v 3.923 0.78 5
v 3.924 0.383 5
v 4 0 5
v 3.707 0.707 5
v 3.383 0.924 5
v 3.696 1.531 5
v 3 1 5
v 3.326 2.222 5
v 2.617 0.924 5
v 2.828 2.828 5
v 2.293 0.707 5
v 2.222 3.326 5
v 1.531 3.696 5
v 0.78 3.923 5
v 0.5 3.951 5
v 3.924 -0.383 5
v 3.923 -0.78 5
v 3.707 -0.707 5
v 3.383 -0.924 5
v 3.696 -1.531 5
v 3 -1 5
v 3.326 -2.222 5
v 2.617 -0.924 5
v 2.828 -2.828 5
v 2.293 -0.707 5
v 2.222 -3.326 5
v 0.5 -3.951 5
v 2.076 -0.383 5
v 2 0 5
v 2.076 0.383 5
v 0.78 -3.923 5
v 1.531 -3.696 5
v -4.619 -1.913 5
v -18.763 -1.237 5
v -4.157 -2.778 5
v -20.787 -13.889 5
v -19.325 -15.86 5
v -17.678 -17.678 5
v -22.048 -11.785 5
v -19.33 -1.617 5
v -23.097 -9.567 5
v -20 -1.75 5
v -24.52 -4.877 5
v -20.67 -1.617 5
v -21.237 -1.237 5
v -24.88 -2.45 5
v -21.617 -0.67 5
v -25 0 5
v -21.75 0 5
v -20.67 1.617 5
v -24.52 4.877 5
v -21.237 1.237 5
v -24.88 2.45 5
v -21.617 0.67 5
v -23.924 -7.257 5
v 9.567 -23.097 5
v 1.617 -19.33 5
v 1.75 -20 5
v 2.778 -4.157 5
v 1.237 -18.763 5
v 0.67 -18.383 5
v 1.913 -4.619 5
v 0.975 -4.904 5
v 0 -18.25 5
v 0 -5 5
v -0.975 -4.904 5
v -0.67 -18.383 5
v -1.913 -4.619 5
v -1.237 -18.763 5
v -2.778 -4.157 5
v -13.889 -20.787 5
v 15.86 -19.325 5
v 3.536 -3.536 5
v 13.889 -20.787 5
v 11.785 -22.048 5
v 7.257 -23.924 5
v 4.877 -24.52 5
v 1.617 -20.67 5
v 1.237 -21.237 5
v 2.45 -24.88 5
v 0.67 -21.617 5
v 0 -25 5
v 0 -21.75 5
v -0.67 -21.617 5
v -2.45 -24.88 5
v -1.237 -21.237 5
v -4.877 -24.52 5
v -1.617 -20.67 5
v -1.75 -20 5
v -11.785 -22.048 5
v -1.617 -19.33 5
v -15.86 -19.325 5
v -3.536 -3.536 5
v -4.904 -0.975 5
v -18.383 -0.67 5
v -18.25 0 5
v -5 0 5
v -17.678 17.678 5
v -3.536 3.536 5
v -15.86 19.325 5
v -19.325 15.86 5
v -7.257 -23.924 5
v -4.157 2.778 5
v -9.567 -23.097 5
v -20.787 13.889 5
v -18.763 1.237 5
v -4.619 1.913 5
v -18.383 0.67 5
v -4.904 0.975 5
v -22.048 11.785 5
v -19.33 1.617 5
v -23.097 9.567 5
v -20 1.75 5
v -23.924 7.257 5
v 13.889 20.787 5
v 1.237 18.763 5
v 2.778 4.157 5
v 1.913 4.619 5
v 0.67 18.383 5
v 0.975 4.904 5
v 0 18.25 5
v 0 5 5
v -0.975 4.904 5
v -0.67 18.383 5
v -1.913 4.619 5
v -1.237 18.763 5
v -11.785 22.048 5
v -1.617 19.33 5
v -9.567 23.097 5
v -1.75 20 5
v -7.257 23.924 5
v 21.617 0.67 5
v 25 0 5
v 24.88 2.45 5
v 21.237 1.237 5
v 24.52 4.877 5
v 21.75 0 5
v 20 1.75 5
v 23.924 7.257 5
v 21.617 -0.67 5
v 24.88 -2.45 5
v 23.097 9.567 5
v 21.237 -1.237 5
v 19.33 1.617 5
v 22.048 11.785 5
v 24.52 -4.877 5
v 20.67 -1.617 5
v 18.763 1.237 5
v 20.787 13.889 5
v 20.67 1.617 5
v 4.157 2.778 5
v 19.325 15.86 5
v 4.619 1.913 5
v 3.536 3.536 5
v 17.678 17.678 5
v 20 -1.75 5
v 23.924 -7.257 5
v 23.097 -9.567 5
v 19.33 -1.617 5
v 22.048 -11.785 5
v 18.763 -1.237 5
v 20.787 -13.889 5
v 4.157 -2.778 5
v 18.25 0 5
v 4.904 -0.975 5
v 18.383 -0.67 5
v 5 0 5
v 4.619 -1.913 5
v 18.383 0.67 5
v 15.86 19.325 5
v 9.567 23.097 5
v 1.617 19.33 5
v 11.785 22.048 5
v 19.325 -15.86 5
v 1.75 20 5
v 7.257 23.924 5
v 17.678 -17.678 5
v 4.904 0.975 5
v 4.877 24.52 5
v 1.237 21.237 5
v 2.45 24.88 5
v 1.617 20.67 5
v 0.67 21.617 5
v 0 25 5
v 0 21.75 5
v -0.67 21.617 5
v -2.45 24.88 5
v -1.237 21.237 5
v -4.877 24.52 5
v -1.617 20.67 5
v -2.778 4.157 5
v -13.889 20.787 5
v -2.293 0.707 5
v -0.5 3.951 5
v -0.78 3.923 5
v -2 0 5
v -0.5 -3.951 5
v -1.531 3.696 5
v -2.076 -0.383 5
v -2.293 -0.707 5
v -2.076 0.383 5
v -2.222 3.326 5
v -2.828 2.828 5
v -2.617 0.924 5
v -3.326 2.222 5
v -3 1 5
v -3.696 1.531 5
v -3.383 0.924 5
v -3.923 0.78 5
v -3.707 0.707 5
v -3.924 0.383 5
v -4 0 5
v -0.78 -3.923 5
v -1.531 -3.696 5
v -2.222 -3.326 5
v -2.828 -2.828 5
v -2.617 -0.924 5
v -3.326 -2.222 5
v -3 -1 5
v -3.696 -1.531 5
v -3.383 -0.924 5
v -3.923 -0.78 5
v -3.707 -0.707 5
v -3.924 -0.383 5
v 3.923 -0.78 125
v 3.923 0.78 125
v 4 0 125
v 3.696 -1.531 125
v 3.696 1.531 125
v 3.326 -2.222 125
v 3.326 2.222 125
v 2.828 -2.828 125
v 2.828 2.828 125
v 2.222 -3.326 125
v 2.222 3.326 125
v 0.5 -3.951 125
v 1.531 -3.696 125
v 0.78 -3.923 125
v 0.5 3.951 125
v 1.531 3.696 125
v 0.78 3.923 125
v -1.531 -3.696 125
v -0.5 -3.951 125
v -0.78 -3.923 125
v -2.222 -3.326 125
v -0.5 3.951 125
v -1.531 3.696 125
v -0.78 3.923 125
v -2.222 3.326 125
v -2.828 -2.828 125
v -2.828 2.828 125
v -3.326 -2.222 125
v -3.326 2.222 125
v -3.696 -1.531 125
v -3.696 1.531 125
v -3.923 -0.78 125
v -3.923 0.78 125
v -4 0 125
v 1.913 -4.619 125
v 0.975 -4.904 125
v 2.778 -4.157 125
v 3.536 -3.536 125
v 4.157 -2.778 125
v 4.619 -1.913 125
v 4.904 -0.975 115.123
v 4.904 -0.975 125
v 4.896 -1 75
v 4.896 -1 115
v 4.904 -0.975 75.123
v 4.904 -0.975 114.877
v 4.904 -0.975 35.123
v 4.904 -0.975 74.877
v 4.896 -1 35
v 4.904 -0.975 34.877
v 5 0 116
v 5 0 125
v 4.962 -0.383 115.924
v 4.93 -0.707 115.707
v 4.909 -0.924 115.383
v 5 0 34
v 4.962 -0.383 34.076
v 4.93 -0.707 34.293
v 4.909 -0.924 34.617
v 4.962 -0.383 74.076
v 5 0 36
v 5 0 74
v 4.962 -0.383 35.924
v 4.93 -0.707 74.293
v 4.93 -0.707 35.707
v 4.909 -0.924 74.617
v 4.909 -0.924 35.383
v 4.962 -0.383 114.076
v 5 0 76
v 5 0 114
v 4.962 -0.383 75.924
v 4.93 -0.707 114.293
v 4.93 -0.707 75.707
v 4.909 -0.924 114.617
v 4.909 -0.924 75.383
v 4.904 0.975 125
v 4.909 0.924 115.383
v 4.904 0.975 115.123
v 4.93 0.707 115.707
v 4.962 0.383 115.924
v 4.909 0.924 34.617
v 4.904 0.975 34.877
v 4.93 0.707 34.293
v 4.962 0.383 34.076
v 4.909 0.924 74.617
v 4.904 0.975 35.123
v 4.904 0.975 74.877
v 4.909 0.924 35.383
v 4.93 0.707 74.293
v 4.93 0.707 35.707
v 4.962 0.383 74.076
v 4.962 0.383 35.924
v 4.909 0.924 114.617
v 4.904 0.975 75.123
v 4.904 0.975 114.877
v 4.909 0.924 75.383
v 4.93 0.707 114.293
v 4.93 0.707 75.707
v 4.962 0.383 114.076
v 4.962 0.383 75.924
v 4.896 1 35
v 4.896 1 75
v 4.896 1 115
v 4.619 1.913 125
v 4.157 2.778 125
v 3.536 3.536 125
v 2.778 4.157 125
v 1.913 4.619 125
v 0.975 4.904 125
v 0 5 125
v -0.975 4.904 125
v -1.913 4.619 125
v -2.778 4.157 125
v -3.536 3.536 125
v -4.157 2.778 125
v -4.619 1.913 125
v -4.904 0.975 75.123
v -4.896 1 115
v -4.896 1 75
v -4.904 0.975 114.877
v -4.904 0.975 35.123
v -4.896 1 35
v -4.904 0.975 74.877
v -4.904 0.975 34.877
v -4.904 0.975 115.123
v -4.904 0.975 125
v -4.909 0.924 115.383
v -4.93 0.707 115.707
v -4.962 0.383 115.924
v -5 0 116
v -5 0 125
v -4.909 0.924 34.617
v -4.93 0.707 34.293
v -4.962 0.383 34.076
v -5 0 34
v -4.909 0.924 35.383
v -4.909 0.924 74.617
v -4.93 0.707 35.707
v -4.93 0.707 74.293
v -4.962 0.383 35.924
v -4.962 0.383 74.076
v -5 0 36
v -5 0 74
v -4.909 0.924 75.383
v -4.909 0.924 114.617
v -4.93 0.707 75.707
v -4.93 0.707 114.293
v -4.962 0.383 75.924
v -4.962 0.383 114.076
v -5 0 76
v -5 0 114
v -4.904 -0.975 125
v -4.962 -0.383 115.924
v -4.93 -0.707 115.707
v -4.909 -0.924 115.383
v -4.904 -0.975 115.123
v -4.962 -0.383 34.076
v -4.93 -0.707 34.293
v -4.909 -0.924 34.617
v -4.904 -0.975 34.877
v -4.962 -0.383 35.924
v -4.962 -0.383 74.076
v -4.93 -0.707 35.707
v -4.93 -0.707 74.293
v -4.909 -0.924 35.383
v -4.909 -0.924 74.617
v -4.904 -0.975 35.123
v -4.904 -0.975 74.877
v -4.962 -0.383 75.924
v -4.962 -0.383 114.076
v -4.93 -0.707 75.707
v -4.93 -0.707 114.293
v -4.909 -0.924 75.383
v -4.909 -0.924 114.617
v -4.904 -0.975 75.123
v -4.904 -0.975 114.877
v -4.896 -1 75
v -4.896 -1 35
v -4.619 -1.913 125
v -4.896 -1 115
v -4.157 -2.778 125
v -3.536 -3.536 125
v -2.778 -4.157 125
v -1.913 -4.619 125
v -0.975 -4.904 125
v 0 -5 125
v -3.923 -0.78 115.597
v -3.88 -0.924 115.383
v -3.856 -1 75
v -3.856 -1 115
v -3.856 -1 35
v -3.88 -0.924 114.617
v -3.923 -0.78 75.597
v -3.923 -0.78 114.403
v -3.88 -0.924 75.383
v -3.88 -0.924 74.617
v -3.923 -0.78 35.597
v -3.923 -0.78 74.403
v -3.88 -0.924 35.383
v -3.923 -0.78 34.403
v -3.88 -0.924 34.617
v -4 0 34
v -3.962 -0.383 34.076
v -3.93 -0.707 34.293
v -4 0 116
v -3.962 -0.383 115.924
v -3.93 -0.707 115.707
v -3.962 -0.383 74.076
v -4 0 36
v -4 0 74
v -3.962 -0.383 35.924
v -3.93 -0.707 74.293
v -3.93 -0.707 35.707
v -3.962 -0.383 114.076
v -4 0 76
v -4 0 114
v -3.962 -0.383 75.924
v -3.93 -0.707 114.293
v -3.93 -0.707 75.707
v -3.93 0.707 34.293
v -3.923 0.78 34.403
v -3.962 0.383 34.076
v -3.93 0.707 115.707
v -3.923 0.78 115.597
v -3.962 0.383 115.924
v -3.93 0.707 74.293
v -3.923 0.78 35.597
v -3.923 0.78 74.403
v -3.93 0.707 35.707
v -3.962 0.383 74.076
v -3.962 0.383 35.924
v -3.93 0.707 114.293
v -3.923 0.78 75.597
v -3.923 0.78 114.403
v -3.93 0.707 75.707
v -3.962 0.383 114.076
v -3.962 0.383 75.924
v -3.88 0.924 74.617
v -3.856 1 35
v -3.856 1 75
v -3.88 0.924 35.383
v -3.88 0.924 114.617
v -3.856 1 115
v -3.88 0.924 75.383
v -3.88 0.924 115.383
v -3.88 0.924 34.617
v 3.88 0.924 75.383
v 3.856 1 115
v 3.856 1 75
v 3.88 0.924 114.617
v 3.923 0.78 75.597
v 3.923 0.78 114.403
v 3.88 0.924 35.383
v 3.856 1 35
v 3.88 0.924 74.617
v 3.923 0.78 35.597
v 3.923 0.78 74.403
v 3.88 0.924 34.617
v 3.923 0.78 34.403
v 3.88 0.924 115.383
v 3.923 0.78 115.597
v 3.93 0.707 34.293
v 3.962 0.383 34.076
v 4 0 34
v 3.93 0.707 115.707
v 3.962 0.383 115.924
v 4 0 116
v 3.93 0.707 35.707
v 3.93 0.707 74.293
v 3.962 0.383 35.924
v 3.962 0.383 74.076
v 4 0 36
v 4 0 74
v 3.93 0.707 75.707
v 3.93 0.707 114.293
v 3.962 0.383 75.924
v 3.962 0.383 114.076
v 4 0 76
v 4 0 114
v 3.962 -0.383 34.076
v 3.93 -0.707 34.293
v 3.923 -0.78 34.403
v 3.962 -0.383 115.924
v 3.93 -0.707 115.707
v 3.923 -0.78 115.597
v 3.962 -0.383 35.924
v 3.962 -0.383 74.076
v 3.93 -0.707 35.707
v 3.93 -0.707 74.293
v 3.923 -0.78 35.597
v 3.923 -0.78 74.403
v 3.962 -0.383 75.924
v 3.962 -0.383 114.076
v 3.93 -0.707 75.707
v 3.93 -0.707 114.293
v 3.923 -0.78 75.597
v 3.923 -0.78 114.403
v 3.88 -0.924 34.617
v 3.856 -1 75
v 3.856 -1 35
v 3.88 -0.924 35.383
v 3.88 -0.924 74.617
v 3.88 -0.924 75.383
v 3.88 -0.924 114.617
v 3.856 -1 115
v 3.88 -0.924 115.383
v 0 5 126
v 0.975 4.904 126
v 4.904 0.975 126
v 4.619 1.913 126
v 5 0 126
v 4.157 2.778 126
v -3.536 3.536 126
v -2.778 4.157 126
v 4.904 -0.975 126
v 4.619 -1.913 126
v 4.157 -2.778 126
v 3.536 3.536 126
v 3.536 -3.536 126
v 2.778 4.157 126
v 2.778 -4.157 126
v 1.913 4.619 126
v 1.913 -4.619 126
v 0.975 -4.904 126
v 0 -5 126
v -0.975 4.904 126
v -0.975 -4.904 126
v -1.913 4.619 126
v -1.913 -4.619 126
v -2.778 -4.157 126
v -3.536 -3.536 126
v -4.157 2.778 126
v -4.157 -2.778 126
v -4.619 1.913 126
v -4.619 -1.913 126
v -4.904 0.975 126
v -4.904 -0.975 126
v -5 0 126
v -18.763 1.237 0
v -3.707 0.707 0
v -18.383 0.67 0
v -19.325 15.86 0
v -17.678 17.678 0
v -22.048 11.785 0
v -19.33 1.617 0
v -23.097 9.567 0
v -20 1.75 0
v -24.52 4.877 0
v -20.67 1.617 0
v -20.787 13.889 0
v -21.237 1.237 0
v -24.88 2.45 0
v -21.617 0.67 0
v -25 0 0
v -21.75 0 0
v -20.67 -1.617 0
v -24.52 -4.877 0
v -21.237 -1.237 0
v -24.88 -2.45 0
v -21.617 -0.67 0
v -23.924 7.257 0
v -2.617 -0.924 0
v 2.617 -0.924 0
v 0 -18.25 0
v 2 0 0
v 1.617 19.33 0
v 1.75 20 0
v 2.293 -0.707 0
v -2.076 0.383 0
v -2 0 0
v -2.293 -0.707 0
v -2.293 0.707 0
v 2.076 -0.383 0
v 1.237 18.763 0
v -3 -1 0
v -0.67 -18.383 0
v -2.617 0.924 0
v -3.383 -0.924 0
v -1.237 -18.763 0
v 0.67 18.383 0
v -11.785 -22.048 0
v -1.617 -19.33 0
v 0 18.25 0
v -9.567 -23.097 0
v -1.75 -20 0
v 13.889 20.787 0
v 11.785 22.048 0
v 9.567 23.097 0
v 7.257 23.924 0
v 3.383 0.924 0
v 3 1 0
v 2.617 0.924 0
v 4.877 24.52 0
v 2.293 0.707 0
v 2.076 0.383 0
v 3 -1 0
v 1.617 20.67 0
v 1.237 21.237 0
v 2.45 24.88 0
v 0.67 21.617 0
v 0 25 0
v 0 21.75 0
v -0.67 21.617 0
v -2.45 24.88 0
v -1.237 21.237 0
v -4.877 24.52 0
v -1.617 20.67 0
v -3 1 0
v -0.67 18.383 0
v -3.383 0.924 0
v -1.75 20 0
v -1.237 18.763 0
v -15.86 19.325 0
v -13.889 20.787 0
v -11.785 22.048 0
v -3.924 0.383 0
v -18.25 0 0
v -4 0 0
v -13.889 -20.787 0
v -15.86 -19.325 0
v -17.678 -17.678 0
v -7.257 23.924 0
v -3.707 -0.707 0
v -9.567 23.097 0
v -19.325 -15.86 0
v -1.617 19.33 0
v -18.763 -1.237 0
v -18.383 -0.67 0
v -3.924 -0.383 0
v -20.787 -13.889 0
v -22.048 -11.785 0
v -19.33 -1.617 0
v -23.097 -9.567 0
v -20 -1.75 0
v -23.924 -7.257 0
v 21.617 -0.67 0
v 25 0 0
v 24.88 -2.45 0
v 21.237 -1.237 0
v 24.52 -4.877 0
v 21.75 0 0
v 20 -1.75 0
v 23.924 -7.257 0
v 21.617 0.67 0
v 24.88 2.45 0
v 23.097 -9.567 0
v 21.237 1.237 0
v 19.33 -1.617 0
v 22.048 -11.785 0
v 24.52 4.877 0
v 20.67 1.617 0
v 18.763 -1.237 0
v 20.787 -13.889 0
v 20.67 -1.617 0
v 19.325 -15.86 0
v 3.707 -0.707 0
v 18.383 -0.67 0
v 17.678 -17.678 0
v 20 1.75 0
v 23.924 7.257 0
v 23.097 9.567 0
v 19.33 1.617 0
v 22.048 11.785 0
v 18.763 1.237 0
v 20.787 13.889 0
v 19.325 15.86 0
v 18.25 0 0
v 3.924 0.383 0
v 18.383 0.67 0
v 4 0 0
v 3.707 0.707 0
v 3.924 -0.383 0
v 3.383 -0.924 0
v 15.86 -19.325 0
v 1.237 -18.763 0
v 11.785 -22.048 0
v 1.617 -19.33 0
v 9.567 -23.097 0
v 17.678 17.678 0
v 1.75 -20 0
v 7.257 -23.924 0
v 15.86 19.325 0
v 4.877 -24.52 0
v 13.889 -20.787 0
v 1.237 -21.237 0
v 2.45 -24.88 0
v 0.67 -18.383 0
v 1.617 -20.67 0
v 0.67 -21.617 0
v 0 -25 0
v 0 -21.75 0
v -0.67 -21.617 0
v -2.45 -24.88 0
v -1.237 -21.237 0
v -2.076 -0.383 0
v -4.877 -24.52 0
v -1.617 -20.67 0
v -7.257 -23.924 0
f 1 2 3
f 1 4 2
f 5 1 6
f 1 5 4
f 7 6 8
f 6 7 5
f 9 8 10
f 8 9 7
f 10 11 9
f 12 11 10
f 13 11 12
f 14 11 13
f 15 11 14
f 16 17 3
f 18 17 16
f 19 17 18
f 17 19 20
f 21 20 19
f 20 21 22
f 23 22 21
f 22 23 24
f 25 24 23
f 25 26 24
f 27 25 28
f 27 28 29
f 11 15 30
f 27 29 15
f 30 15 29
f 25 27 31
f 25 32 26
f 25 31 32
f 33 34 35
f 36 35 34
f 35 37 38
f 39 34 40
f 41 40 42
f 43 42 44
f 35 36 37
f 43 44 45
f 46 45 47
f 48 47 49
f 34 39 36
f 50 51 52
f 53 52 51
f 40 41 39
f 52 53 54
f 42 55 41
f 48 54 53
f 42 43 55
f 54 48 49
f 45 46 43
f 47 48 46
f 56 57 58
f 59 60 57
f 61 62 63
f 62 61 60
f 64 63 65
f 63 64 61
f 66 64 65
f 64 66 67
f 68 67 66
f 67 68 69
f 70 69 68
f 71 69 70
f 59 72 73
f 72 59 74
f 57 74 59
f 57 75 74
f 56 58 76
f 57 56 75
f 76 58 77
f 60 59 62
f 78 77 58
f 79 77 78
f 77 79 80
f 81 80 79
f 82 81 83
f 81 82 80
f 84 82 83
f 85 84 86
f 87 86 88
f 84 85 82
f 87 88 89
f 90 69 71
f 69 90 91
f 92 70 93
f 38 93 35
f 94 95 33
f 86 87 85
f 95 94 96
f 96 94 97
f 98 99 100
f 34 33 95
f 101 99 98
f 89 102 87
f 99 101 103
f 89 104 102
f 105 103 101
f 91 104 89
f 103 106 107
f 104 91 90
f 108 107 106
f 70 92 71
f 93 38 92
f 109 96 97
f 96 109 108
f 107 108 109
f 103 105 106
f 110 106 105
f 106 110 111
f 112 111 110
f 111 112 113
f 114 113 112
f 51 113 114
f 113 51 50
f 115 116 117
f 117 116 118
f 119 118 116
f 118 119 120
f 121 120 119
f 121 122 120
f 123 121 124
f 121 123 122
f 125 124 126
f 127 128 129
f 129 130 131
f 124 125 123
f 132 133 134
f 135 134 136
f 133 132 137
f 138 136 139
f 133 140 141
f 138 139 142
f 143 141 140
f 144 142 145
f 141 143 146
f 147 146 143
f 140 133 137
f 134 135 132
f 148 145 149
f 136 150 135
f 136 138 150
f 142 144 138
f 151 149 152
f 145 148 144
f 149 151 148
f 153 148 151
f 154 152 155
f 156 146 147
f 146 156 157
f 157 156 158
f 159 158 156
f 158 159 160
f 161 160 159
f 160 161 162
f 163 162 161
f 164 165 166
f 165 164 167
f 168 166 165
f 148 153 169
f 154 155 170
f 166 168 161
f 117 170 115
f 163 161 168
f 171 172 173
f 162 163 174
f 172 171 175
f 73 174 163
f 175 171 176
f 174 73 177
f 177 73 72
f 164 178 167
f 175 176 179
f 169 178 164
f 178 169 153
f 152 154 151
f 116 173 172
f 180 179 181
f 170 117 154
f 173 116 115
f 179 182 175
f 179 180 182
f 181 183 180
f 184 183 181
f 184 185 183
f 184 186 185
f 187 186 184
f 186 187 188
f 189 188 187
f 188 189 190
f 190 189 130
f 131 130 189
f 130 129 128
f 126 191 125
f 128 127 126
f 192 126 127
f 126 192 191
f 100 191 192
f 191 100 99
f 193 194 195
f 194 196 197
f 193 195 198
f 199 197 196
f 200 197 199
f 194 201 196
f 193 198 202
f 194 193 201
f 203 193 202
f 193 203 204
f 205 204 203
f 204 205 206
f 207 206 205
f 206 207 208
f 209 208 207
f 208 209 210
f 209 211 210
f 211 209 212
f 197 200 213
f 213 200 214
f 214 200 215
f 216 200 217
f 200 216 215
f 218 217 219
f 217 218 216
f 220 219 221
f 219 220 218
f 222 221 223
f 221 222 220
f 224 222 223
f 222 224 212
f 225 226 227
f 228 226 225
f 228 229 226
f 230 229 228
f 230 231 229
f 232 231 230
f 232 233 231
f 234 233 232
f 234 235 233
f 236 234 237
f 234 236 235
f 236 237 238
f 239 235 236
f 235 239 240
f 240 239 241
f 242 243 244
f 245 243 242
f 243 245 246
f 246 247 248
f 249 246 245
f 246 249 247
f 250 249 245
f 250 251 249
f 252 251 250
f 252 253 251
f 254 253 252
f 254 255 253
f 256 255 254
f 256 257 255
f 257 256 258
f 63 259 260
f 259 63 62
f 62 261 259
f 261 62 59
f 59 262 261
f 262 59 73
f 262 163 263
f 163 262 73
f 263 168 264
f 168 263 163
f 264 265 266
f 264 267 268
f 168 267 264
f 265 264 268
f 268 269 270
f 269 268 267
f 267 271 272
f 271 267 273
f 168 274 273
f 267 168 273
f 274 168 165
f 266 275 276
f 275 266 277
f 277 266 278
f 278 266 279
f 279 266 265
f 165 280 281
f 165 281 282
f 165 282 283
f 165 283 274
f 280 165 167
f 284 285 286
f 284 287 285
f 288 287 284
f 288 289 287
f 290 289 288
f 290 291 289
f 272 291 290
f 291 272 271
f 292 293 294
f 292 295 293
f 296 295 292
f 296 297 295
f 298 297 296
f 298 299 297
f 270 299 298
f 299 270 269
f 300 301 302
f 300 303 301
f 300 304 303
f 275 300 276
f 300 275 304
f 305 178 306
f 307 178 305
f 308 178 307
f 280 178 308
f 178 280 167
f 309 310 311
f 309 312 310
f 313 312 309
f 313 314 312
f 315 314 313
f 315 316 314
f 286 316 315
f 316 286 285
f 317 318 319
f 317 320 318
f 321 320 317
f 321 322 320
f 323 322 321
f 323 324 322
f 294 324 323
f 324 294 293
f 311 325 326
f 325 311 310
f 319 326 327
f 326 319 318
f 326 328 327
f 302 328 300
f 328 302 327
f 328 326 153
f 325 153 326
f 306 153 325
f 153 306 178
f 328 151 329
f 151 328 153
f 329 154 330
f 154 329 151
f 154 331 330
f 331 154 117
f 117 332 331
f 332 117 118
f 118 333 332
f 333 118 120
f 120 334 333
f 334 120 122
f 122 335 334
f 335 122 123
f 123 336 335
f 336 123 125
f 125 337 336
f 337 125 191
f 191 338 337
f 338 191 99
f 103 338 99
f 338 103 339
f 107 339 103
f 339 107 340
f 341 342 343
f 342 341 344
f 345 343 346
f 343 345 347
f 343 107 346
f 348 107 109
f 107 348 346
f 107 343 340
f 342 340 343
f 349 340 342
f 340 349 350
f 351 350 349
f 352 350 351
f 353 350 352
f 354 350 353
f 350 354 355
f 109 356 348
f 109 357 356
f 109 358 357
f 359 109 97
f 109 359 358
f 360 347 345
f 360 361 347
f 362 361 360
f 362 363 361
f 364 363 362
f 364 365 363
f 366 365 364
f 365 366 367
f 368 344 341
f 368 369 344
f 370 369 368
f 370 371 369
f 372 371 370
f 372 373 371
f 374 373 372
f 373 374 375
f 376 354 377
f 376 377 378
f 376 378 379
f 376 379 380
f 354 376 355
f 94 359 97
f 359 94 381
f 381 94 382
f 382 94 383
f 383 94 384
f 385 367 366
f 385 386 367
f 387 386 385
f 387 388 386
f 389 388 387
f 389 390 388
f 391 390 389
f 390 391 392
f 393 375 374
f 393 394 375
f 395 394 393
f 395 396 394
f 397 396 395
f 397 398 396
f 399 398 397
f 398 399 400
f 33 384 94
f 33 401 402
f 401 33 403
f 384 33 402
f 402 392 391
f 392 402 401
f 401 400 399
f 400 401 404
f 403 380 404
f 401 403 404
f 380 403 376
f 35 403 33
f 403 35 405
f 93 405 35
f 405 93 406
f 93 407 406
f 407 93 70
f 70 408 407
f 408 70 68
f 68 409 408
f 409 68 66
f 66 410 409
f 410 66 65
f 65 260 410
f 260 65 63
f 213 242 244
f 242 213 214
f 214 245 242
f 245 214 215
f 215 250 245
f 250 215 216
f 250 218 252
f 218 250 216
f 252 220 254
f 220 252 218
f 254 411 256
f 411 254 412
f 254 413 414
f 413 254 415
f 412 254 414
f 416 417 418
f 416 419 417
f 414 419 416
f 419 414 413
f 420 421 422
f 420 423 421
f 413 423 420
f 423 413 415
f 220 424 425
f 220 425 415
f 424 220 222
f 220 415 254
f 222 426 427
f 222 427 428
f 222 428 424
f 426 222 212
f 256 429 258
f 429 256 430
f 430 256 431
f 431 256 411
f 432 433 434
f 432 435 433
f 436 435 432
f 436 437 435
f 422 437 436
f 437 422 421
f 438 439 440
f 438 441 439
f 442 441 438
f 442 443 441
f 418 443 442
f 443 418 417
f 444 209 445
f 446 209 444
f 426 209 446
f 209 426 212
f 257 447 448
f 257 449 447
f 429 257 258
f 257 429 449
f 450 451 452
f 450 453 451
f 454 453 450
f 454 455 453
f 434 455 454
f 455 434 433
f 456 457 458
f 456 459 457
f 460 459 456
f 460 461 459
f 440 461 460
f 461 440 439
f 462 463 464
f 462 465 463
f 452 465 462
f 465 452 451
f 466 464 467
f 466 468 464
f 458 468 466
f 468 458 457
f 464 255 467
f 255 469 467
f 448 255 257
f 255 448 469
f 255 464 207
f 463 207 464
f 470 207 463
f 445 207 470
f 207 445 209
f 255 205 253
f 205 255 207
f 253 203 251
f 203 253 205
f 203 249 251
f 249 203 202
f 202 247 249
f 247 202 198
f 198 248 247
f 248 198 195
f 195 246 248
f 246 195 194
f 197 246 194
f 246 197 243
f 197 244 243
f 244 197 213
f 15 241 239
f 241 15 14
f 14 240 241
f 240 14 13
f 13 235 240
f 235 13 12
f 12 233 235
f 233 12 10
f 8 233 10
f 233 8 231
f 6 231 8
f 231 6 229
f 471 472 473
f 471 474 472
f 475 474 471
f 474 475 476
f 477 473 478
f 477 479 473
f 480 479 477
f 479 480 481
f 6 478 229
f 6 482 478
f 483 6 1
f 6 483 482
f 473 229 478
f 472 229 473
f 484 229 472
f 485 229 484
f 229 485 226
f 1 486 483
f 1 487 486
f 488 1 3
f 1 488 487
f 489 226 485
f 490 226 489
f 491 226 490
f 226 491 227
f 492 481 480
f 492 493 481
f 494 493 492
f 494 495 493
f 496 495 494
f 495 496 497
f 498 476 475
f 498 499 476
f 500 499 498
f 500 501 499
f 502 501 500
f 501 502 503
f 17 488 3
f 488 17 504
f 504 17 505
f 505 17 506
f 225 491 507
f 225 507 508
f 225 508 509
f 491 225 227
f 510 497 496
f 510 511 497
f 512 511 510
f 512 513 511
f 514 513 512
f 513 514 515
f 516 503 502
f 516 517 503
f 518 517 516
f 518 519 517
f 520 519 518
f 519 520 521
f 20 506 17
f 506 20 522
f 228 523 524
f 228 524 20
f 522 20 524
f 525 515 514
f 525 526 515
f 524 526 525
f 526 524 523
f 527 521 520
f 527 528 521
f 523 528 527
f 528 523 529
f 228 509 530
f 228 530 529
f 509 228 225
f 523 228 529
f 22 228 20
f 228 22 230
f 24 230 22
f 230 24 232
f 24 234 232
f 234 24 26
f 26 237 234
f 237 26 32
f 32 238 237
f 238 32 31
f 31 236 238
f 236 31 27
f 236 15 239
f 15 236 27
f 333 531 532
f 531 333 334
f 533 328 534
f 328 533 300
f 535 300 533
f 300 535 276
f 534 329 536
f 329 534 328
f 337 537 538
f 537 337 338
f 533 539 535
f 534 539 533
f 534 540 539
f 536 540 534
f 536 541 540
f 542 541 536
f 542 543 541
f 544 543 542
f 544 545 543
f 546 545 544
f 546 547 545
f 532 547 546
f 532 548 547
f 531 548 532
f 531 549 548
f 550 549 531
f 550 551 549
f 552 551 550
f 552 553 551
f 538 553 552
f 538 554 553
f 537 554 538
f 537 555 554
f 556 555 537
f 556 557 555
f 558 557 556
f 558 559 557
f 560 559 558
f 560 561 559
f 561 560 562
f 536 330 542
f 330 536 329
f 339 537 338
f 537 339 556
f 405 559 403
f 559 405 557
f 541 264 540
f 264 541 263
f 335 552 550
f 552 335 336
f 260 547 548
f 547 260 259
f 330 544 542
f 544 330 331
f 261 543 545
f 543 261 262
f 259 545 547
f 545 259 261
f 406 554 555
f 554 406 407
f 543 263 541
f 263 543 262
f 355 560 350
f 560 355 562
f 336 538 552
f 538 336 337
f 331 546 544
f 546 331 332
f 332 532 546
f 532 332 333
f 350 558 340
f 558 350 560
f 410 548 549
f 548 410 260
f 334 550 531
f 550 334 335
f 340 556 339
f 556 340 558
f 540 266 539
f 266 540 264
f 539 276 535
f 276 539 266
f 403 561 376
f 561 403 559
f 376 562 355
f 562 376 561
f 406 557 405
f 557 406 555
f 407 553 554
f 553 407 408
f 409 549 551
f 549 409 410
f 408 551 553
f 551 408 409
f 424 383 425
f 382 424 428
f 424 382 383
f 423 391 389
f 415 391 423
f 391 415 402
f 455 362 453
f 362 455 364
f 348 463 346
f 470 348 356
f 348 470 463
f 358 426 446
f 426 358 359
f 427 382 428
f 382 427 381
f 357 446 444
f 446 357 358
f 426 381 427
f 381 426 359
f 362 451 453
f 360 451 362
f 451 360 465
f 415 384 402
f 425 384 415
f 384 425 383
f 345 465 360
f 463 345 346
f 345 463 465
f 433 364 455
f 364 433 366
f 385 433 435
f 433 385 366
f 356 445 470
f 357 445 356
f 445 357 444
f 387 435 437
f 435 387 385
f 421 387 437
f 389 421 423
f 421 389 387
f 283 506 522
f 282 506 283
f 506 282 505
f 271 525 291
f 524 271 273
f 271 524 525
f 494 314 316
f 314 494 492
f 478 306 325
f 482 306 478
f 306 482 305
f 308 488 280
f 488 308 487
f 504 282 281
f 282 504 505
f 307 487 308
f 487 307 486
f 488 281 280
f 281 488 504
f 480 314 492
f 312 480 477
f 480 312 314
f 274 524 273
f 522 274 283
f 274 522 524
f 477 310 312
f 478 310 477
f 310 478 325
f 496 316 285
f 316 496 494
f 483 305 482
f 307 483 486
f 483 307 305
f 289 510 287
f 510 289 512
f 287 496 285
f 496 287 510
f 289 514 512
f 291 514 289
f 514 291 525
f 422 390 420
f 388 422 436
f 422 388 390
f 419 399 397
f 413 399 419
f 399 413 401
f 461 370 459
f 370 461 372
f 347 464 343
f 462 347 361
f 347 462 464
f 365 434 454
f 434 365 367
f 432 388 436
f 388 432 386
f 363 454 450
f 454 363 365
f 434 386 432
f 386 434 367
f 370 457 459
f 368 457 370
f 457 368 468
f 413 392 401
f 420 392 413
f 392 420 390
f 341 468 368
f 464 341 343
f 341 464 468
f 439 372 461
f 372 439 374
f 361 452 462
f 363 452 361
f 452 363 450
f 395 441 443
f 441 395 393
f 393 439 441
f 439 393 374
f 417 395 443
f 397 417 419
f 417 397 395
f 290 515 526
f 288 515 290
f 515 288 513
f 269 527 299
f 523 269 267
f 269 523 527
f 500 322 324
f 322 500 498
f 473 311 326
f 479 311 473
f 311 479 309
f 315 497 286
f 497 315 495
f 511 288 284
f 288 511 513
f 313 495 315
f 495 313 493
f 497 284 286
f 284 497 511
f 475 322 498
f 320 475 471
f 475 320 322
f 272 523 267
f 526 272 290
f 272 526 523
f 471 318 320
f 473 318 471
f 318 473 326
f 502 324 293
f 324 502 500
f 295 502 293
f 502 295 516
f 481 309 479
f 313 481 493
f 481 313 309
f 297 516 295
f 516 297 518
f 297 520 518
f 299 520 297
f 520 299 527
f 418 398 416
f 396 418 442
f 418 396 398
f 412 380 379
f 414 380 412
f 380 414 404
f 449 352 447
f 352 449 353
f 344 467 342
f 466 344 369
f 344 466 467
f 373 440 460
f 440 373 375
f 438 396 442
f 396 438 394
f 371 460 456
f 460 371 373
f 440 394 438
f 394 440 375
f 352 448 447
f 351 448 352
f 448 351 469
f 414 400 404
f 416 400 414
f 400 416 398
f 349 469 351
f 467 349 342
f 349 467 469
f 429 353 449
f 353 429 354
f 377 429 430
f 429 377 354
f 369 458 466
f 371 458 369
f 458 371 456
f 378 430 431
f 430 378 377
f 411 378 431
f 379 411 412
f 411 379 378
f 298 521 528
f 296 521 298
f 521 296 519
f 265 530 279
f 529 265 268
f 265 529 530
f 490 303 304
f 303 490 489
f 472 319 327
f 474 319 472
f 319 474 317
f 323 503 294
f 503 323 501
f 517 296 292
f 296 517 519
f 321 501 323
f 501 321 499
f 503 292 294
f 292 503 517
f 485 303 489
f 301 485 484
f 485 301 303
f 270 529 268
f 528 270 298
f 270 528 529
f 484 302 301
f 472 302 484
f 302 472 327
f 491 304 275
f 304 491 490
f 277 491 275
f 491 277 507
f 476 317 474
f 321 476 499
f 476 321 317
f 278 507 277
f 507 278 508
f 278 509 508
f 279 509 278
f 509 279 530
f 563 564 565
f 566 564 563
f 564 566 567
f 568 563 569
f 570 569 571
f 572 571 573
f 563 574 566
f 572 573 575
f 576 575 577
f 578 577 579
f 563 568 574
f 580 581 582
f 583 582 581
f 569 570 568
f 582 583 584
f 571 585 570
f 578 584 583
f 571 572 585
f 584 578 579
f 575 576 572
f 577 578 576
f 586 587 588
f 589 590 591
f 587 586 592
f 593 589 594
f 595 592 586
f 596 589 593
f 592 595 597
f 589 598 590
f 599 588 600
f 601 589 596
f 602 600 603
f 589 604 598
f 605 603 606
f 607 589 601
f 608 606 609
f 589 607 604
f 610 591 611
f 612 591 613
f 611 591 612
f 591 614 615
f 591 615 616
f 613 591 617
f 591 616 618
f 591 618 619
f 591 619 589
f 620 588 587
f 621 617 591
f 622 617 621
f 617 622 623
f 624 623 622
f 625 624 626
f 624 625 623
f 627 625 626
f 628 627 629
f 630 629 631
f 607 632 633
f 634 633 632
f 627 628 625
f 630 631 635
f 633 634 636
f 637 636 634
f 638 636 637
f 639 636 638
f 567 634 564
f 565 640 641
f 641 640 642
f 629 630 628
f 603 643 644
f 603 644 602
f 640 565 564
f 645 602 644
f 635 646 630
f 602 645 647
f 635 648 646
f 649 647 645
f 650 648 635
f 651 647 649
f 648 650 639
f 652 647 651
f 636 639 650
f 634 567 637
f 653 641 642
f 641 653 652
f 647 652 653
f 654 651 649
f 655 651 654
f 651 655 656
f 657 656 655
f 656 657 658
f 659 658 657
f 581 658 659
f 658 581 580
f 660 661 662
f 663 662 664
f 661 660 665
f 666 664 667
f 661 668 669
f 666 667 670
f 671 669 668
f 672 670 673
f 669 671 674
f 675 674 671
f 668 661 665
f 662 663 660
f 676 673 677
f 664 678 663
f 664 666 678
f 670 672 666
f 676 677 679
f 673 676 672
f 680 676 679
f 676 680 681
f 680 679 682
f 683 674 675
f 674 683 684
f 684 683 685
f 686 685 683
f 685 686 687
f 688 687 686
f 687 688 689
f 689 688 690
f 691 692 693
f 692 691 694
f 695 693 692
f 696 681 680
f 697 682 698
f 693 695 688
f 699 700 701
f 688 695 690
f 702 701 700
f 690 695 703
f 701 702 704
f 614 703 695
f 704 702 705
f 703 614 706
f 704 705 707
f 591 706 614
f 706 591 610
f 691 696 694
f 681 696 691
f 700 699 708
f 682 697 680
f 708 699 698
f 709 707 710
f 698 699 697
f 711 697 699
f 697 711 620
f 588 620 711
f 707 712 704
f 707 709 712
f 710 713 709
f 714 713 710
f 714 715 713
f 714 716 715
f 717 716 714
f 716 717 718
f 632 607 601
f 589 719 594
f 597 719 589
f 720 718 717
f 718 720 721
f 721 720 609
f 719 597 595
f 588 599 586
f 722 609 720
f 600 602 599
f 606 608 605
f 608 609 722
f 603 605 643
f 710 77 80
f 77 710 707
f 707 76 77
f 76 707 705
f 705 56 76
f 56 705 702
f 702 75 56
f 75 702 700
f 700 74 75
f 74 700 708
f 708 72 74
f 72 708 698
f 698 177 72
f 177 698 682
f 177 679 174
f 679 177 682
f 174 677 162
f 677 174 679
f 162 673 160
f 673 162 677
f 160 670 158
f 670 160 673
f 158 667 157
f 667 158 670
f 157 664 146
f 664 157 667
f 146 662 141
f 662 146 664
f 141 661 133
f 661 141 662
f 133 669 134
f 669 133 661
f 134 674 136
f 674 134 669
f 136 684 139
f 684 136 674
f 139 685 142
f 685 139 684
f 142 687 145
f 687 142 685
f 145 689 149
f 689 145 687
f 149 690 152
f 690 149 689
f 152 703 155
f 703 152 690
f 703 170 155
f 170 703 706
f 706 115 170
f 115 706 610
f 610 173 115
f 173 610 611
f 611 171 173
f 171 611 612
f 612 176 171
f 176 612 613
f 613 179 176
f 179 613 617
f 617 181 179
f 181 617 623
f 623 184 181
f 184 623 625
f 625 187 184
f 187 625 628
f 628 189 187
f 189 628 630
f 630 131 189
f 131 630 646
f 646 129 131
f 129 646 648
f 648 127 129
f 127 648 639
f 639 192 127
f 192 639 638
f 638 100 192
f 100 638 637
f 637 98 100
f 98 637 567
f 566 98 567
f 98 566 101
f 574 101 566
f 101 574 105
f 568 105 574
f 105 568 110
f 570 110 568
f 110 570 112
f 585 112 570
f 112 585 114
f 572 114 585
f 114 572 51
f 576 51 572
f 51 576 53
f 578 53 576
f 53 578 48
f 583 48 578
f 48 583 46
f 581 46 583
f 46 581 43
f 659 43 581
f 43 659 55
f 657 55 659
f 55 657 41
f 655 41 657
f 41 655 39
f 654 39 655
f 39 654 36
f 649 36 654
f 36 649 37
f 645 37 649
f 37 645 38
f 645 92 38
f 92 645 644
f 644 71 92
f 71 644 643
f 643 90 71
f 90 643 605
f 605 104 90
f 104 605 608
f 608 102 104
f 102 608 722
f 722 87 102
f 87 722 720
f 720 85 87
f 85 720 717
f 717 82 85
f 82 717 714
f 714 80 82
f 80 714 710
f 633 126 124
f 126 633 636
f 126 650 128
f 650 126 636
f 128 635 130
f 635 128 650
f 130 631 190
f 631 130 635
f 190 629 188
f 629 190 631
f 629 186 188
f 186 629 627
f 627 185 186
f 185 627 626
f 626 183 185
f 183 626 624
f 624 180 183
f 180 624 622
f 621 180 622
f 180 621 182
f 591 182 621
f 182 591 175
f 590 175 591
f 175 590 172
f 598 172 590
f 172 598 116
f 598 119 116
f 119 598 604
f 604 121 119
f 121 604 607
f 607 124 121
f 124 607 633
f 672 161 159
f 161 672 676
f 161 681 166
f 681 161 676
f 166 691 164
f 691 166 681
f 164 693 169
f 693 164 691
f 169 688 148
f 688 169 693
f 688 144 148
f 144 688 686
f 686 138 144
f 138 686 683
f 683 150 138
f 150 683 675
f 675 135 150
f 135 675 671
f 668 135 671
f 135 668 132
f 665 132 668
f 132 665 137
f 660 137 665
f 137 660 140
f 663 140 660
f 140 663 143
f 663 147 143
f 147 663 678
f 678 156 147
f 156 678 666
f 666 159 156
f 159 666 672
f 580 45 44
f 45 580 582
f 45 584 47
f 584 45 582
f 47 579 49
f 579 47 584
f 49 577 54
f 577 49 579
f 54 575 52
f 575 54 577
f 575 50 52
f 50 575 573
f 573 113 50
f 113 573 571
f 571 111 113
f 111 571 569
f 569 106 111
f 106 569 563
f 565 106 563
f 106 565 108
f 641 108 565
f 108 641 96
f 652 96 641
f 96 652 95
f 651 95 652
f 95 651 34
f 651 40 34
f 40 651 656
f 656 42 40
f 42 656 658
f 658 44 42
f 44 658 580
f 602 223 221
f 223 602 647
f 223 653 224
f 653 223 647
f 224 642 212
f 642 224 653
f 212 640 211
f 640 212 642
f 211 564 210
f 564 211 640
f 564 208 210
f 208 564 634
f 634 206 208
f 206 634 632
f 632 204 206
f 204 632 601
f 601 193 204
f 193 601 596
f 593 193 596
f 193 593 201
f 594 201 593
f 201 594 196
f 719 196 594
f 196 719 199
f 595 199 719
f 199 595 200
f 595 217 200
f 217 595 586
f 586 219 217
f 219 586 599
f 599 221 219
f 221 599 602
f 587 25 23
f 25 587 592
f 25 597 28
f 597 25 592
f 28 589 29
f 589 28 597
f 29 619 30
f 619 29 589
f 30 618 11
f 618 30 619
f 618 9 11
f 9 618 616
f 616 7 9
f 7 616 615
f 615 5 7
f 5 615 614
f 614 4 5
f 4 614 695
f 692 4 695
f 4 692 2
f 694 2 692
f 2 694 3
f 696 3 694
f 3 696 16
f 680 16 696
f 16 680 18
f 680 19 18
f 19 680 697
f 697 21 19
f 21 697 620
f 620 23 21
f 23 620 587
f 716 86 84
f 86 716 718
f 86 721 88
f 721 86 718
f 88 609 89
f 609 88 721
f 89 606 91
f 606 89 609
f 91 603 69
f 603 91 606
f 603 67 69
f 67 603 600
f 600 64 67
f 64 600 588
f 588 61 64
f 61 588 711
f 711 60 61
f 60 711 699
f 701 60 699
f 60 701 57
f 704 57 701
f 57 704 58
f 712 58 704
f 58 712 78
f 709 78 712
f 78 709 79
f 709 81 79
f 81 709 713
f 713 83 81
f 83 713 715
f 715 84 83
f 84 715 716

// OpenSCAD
probe_outer_diameter = 10;
probe_wall_thickness = 1;
probe_length = 120;

probe_hole_diameter = 2;
probe_hole_positions = [30, 70, 110];

flange_outer_diameter = 50;
flange_thickness = 5;

flange_mounting_hole_diameter = 3.5;
flange_mounting_hole_offset = 20;
flange_mounting_hole_count = 4;

color("blue") {
  linear_extrude(flange_thickness) {
    difference() {
      // Body
      circle(d = flange_outer_diameter, $fn = 64);

      // Place mounting holes
      for (i = [0:360 / flange_mounting_hole_count:360]) {
        rotate([0, 0, i]) {
          translate([flange_mounting_hole_offset, 0]) {
            circle(d = flange_mounting_hole_diameter, $fn = 16);
          }
        }
      }

      // Total/static vent holes
      for (x = [-3, 3]) {
        translate([x, 0]) {
          circle(d = 2, $fn = 16);
        }
      }
    }
  }
}

translate([0, 0, flange_thickness]) {
  difference() {
    union() {
      color("green") {
        linear_extrude(probe_length) {
          difference() {
            circle(d = probe_outer_diameter, $fn = 32);
            circle(d = probe_outer_diameter - (2 * probe_wall_thickness), $fn = 32);
          }

          square([probe_wall_thickness, probe_outer_diameter - 1], center = true);
        }
      }

      color("red") {
        translate([0, 0, probe_length]) {
          cylinder(h = probe_wall_thickness, d = probe_outer_diameter, $fn = 32);
        }
      }
    }

    for(z = probe_hole_positions) {
      for(a = [-probe_outer_diameter / 2, probe_outer_diameter / 2]) {
        translate([a, 0, z]) {
          rotate([0, 90, 0]) {
            cylinder(h = probe_wall_thickness + 2, d = probe_hole_diameter, center = true, $fn = 16);
          }
        }
      }
    }
  }
}
